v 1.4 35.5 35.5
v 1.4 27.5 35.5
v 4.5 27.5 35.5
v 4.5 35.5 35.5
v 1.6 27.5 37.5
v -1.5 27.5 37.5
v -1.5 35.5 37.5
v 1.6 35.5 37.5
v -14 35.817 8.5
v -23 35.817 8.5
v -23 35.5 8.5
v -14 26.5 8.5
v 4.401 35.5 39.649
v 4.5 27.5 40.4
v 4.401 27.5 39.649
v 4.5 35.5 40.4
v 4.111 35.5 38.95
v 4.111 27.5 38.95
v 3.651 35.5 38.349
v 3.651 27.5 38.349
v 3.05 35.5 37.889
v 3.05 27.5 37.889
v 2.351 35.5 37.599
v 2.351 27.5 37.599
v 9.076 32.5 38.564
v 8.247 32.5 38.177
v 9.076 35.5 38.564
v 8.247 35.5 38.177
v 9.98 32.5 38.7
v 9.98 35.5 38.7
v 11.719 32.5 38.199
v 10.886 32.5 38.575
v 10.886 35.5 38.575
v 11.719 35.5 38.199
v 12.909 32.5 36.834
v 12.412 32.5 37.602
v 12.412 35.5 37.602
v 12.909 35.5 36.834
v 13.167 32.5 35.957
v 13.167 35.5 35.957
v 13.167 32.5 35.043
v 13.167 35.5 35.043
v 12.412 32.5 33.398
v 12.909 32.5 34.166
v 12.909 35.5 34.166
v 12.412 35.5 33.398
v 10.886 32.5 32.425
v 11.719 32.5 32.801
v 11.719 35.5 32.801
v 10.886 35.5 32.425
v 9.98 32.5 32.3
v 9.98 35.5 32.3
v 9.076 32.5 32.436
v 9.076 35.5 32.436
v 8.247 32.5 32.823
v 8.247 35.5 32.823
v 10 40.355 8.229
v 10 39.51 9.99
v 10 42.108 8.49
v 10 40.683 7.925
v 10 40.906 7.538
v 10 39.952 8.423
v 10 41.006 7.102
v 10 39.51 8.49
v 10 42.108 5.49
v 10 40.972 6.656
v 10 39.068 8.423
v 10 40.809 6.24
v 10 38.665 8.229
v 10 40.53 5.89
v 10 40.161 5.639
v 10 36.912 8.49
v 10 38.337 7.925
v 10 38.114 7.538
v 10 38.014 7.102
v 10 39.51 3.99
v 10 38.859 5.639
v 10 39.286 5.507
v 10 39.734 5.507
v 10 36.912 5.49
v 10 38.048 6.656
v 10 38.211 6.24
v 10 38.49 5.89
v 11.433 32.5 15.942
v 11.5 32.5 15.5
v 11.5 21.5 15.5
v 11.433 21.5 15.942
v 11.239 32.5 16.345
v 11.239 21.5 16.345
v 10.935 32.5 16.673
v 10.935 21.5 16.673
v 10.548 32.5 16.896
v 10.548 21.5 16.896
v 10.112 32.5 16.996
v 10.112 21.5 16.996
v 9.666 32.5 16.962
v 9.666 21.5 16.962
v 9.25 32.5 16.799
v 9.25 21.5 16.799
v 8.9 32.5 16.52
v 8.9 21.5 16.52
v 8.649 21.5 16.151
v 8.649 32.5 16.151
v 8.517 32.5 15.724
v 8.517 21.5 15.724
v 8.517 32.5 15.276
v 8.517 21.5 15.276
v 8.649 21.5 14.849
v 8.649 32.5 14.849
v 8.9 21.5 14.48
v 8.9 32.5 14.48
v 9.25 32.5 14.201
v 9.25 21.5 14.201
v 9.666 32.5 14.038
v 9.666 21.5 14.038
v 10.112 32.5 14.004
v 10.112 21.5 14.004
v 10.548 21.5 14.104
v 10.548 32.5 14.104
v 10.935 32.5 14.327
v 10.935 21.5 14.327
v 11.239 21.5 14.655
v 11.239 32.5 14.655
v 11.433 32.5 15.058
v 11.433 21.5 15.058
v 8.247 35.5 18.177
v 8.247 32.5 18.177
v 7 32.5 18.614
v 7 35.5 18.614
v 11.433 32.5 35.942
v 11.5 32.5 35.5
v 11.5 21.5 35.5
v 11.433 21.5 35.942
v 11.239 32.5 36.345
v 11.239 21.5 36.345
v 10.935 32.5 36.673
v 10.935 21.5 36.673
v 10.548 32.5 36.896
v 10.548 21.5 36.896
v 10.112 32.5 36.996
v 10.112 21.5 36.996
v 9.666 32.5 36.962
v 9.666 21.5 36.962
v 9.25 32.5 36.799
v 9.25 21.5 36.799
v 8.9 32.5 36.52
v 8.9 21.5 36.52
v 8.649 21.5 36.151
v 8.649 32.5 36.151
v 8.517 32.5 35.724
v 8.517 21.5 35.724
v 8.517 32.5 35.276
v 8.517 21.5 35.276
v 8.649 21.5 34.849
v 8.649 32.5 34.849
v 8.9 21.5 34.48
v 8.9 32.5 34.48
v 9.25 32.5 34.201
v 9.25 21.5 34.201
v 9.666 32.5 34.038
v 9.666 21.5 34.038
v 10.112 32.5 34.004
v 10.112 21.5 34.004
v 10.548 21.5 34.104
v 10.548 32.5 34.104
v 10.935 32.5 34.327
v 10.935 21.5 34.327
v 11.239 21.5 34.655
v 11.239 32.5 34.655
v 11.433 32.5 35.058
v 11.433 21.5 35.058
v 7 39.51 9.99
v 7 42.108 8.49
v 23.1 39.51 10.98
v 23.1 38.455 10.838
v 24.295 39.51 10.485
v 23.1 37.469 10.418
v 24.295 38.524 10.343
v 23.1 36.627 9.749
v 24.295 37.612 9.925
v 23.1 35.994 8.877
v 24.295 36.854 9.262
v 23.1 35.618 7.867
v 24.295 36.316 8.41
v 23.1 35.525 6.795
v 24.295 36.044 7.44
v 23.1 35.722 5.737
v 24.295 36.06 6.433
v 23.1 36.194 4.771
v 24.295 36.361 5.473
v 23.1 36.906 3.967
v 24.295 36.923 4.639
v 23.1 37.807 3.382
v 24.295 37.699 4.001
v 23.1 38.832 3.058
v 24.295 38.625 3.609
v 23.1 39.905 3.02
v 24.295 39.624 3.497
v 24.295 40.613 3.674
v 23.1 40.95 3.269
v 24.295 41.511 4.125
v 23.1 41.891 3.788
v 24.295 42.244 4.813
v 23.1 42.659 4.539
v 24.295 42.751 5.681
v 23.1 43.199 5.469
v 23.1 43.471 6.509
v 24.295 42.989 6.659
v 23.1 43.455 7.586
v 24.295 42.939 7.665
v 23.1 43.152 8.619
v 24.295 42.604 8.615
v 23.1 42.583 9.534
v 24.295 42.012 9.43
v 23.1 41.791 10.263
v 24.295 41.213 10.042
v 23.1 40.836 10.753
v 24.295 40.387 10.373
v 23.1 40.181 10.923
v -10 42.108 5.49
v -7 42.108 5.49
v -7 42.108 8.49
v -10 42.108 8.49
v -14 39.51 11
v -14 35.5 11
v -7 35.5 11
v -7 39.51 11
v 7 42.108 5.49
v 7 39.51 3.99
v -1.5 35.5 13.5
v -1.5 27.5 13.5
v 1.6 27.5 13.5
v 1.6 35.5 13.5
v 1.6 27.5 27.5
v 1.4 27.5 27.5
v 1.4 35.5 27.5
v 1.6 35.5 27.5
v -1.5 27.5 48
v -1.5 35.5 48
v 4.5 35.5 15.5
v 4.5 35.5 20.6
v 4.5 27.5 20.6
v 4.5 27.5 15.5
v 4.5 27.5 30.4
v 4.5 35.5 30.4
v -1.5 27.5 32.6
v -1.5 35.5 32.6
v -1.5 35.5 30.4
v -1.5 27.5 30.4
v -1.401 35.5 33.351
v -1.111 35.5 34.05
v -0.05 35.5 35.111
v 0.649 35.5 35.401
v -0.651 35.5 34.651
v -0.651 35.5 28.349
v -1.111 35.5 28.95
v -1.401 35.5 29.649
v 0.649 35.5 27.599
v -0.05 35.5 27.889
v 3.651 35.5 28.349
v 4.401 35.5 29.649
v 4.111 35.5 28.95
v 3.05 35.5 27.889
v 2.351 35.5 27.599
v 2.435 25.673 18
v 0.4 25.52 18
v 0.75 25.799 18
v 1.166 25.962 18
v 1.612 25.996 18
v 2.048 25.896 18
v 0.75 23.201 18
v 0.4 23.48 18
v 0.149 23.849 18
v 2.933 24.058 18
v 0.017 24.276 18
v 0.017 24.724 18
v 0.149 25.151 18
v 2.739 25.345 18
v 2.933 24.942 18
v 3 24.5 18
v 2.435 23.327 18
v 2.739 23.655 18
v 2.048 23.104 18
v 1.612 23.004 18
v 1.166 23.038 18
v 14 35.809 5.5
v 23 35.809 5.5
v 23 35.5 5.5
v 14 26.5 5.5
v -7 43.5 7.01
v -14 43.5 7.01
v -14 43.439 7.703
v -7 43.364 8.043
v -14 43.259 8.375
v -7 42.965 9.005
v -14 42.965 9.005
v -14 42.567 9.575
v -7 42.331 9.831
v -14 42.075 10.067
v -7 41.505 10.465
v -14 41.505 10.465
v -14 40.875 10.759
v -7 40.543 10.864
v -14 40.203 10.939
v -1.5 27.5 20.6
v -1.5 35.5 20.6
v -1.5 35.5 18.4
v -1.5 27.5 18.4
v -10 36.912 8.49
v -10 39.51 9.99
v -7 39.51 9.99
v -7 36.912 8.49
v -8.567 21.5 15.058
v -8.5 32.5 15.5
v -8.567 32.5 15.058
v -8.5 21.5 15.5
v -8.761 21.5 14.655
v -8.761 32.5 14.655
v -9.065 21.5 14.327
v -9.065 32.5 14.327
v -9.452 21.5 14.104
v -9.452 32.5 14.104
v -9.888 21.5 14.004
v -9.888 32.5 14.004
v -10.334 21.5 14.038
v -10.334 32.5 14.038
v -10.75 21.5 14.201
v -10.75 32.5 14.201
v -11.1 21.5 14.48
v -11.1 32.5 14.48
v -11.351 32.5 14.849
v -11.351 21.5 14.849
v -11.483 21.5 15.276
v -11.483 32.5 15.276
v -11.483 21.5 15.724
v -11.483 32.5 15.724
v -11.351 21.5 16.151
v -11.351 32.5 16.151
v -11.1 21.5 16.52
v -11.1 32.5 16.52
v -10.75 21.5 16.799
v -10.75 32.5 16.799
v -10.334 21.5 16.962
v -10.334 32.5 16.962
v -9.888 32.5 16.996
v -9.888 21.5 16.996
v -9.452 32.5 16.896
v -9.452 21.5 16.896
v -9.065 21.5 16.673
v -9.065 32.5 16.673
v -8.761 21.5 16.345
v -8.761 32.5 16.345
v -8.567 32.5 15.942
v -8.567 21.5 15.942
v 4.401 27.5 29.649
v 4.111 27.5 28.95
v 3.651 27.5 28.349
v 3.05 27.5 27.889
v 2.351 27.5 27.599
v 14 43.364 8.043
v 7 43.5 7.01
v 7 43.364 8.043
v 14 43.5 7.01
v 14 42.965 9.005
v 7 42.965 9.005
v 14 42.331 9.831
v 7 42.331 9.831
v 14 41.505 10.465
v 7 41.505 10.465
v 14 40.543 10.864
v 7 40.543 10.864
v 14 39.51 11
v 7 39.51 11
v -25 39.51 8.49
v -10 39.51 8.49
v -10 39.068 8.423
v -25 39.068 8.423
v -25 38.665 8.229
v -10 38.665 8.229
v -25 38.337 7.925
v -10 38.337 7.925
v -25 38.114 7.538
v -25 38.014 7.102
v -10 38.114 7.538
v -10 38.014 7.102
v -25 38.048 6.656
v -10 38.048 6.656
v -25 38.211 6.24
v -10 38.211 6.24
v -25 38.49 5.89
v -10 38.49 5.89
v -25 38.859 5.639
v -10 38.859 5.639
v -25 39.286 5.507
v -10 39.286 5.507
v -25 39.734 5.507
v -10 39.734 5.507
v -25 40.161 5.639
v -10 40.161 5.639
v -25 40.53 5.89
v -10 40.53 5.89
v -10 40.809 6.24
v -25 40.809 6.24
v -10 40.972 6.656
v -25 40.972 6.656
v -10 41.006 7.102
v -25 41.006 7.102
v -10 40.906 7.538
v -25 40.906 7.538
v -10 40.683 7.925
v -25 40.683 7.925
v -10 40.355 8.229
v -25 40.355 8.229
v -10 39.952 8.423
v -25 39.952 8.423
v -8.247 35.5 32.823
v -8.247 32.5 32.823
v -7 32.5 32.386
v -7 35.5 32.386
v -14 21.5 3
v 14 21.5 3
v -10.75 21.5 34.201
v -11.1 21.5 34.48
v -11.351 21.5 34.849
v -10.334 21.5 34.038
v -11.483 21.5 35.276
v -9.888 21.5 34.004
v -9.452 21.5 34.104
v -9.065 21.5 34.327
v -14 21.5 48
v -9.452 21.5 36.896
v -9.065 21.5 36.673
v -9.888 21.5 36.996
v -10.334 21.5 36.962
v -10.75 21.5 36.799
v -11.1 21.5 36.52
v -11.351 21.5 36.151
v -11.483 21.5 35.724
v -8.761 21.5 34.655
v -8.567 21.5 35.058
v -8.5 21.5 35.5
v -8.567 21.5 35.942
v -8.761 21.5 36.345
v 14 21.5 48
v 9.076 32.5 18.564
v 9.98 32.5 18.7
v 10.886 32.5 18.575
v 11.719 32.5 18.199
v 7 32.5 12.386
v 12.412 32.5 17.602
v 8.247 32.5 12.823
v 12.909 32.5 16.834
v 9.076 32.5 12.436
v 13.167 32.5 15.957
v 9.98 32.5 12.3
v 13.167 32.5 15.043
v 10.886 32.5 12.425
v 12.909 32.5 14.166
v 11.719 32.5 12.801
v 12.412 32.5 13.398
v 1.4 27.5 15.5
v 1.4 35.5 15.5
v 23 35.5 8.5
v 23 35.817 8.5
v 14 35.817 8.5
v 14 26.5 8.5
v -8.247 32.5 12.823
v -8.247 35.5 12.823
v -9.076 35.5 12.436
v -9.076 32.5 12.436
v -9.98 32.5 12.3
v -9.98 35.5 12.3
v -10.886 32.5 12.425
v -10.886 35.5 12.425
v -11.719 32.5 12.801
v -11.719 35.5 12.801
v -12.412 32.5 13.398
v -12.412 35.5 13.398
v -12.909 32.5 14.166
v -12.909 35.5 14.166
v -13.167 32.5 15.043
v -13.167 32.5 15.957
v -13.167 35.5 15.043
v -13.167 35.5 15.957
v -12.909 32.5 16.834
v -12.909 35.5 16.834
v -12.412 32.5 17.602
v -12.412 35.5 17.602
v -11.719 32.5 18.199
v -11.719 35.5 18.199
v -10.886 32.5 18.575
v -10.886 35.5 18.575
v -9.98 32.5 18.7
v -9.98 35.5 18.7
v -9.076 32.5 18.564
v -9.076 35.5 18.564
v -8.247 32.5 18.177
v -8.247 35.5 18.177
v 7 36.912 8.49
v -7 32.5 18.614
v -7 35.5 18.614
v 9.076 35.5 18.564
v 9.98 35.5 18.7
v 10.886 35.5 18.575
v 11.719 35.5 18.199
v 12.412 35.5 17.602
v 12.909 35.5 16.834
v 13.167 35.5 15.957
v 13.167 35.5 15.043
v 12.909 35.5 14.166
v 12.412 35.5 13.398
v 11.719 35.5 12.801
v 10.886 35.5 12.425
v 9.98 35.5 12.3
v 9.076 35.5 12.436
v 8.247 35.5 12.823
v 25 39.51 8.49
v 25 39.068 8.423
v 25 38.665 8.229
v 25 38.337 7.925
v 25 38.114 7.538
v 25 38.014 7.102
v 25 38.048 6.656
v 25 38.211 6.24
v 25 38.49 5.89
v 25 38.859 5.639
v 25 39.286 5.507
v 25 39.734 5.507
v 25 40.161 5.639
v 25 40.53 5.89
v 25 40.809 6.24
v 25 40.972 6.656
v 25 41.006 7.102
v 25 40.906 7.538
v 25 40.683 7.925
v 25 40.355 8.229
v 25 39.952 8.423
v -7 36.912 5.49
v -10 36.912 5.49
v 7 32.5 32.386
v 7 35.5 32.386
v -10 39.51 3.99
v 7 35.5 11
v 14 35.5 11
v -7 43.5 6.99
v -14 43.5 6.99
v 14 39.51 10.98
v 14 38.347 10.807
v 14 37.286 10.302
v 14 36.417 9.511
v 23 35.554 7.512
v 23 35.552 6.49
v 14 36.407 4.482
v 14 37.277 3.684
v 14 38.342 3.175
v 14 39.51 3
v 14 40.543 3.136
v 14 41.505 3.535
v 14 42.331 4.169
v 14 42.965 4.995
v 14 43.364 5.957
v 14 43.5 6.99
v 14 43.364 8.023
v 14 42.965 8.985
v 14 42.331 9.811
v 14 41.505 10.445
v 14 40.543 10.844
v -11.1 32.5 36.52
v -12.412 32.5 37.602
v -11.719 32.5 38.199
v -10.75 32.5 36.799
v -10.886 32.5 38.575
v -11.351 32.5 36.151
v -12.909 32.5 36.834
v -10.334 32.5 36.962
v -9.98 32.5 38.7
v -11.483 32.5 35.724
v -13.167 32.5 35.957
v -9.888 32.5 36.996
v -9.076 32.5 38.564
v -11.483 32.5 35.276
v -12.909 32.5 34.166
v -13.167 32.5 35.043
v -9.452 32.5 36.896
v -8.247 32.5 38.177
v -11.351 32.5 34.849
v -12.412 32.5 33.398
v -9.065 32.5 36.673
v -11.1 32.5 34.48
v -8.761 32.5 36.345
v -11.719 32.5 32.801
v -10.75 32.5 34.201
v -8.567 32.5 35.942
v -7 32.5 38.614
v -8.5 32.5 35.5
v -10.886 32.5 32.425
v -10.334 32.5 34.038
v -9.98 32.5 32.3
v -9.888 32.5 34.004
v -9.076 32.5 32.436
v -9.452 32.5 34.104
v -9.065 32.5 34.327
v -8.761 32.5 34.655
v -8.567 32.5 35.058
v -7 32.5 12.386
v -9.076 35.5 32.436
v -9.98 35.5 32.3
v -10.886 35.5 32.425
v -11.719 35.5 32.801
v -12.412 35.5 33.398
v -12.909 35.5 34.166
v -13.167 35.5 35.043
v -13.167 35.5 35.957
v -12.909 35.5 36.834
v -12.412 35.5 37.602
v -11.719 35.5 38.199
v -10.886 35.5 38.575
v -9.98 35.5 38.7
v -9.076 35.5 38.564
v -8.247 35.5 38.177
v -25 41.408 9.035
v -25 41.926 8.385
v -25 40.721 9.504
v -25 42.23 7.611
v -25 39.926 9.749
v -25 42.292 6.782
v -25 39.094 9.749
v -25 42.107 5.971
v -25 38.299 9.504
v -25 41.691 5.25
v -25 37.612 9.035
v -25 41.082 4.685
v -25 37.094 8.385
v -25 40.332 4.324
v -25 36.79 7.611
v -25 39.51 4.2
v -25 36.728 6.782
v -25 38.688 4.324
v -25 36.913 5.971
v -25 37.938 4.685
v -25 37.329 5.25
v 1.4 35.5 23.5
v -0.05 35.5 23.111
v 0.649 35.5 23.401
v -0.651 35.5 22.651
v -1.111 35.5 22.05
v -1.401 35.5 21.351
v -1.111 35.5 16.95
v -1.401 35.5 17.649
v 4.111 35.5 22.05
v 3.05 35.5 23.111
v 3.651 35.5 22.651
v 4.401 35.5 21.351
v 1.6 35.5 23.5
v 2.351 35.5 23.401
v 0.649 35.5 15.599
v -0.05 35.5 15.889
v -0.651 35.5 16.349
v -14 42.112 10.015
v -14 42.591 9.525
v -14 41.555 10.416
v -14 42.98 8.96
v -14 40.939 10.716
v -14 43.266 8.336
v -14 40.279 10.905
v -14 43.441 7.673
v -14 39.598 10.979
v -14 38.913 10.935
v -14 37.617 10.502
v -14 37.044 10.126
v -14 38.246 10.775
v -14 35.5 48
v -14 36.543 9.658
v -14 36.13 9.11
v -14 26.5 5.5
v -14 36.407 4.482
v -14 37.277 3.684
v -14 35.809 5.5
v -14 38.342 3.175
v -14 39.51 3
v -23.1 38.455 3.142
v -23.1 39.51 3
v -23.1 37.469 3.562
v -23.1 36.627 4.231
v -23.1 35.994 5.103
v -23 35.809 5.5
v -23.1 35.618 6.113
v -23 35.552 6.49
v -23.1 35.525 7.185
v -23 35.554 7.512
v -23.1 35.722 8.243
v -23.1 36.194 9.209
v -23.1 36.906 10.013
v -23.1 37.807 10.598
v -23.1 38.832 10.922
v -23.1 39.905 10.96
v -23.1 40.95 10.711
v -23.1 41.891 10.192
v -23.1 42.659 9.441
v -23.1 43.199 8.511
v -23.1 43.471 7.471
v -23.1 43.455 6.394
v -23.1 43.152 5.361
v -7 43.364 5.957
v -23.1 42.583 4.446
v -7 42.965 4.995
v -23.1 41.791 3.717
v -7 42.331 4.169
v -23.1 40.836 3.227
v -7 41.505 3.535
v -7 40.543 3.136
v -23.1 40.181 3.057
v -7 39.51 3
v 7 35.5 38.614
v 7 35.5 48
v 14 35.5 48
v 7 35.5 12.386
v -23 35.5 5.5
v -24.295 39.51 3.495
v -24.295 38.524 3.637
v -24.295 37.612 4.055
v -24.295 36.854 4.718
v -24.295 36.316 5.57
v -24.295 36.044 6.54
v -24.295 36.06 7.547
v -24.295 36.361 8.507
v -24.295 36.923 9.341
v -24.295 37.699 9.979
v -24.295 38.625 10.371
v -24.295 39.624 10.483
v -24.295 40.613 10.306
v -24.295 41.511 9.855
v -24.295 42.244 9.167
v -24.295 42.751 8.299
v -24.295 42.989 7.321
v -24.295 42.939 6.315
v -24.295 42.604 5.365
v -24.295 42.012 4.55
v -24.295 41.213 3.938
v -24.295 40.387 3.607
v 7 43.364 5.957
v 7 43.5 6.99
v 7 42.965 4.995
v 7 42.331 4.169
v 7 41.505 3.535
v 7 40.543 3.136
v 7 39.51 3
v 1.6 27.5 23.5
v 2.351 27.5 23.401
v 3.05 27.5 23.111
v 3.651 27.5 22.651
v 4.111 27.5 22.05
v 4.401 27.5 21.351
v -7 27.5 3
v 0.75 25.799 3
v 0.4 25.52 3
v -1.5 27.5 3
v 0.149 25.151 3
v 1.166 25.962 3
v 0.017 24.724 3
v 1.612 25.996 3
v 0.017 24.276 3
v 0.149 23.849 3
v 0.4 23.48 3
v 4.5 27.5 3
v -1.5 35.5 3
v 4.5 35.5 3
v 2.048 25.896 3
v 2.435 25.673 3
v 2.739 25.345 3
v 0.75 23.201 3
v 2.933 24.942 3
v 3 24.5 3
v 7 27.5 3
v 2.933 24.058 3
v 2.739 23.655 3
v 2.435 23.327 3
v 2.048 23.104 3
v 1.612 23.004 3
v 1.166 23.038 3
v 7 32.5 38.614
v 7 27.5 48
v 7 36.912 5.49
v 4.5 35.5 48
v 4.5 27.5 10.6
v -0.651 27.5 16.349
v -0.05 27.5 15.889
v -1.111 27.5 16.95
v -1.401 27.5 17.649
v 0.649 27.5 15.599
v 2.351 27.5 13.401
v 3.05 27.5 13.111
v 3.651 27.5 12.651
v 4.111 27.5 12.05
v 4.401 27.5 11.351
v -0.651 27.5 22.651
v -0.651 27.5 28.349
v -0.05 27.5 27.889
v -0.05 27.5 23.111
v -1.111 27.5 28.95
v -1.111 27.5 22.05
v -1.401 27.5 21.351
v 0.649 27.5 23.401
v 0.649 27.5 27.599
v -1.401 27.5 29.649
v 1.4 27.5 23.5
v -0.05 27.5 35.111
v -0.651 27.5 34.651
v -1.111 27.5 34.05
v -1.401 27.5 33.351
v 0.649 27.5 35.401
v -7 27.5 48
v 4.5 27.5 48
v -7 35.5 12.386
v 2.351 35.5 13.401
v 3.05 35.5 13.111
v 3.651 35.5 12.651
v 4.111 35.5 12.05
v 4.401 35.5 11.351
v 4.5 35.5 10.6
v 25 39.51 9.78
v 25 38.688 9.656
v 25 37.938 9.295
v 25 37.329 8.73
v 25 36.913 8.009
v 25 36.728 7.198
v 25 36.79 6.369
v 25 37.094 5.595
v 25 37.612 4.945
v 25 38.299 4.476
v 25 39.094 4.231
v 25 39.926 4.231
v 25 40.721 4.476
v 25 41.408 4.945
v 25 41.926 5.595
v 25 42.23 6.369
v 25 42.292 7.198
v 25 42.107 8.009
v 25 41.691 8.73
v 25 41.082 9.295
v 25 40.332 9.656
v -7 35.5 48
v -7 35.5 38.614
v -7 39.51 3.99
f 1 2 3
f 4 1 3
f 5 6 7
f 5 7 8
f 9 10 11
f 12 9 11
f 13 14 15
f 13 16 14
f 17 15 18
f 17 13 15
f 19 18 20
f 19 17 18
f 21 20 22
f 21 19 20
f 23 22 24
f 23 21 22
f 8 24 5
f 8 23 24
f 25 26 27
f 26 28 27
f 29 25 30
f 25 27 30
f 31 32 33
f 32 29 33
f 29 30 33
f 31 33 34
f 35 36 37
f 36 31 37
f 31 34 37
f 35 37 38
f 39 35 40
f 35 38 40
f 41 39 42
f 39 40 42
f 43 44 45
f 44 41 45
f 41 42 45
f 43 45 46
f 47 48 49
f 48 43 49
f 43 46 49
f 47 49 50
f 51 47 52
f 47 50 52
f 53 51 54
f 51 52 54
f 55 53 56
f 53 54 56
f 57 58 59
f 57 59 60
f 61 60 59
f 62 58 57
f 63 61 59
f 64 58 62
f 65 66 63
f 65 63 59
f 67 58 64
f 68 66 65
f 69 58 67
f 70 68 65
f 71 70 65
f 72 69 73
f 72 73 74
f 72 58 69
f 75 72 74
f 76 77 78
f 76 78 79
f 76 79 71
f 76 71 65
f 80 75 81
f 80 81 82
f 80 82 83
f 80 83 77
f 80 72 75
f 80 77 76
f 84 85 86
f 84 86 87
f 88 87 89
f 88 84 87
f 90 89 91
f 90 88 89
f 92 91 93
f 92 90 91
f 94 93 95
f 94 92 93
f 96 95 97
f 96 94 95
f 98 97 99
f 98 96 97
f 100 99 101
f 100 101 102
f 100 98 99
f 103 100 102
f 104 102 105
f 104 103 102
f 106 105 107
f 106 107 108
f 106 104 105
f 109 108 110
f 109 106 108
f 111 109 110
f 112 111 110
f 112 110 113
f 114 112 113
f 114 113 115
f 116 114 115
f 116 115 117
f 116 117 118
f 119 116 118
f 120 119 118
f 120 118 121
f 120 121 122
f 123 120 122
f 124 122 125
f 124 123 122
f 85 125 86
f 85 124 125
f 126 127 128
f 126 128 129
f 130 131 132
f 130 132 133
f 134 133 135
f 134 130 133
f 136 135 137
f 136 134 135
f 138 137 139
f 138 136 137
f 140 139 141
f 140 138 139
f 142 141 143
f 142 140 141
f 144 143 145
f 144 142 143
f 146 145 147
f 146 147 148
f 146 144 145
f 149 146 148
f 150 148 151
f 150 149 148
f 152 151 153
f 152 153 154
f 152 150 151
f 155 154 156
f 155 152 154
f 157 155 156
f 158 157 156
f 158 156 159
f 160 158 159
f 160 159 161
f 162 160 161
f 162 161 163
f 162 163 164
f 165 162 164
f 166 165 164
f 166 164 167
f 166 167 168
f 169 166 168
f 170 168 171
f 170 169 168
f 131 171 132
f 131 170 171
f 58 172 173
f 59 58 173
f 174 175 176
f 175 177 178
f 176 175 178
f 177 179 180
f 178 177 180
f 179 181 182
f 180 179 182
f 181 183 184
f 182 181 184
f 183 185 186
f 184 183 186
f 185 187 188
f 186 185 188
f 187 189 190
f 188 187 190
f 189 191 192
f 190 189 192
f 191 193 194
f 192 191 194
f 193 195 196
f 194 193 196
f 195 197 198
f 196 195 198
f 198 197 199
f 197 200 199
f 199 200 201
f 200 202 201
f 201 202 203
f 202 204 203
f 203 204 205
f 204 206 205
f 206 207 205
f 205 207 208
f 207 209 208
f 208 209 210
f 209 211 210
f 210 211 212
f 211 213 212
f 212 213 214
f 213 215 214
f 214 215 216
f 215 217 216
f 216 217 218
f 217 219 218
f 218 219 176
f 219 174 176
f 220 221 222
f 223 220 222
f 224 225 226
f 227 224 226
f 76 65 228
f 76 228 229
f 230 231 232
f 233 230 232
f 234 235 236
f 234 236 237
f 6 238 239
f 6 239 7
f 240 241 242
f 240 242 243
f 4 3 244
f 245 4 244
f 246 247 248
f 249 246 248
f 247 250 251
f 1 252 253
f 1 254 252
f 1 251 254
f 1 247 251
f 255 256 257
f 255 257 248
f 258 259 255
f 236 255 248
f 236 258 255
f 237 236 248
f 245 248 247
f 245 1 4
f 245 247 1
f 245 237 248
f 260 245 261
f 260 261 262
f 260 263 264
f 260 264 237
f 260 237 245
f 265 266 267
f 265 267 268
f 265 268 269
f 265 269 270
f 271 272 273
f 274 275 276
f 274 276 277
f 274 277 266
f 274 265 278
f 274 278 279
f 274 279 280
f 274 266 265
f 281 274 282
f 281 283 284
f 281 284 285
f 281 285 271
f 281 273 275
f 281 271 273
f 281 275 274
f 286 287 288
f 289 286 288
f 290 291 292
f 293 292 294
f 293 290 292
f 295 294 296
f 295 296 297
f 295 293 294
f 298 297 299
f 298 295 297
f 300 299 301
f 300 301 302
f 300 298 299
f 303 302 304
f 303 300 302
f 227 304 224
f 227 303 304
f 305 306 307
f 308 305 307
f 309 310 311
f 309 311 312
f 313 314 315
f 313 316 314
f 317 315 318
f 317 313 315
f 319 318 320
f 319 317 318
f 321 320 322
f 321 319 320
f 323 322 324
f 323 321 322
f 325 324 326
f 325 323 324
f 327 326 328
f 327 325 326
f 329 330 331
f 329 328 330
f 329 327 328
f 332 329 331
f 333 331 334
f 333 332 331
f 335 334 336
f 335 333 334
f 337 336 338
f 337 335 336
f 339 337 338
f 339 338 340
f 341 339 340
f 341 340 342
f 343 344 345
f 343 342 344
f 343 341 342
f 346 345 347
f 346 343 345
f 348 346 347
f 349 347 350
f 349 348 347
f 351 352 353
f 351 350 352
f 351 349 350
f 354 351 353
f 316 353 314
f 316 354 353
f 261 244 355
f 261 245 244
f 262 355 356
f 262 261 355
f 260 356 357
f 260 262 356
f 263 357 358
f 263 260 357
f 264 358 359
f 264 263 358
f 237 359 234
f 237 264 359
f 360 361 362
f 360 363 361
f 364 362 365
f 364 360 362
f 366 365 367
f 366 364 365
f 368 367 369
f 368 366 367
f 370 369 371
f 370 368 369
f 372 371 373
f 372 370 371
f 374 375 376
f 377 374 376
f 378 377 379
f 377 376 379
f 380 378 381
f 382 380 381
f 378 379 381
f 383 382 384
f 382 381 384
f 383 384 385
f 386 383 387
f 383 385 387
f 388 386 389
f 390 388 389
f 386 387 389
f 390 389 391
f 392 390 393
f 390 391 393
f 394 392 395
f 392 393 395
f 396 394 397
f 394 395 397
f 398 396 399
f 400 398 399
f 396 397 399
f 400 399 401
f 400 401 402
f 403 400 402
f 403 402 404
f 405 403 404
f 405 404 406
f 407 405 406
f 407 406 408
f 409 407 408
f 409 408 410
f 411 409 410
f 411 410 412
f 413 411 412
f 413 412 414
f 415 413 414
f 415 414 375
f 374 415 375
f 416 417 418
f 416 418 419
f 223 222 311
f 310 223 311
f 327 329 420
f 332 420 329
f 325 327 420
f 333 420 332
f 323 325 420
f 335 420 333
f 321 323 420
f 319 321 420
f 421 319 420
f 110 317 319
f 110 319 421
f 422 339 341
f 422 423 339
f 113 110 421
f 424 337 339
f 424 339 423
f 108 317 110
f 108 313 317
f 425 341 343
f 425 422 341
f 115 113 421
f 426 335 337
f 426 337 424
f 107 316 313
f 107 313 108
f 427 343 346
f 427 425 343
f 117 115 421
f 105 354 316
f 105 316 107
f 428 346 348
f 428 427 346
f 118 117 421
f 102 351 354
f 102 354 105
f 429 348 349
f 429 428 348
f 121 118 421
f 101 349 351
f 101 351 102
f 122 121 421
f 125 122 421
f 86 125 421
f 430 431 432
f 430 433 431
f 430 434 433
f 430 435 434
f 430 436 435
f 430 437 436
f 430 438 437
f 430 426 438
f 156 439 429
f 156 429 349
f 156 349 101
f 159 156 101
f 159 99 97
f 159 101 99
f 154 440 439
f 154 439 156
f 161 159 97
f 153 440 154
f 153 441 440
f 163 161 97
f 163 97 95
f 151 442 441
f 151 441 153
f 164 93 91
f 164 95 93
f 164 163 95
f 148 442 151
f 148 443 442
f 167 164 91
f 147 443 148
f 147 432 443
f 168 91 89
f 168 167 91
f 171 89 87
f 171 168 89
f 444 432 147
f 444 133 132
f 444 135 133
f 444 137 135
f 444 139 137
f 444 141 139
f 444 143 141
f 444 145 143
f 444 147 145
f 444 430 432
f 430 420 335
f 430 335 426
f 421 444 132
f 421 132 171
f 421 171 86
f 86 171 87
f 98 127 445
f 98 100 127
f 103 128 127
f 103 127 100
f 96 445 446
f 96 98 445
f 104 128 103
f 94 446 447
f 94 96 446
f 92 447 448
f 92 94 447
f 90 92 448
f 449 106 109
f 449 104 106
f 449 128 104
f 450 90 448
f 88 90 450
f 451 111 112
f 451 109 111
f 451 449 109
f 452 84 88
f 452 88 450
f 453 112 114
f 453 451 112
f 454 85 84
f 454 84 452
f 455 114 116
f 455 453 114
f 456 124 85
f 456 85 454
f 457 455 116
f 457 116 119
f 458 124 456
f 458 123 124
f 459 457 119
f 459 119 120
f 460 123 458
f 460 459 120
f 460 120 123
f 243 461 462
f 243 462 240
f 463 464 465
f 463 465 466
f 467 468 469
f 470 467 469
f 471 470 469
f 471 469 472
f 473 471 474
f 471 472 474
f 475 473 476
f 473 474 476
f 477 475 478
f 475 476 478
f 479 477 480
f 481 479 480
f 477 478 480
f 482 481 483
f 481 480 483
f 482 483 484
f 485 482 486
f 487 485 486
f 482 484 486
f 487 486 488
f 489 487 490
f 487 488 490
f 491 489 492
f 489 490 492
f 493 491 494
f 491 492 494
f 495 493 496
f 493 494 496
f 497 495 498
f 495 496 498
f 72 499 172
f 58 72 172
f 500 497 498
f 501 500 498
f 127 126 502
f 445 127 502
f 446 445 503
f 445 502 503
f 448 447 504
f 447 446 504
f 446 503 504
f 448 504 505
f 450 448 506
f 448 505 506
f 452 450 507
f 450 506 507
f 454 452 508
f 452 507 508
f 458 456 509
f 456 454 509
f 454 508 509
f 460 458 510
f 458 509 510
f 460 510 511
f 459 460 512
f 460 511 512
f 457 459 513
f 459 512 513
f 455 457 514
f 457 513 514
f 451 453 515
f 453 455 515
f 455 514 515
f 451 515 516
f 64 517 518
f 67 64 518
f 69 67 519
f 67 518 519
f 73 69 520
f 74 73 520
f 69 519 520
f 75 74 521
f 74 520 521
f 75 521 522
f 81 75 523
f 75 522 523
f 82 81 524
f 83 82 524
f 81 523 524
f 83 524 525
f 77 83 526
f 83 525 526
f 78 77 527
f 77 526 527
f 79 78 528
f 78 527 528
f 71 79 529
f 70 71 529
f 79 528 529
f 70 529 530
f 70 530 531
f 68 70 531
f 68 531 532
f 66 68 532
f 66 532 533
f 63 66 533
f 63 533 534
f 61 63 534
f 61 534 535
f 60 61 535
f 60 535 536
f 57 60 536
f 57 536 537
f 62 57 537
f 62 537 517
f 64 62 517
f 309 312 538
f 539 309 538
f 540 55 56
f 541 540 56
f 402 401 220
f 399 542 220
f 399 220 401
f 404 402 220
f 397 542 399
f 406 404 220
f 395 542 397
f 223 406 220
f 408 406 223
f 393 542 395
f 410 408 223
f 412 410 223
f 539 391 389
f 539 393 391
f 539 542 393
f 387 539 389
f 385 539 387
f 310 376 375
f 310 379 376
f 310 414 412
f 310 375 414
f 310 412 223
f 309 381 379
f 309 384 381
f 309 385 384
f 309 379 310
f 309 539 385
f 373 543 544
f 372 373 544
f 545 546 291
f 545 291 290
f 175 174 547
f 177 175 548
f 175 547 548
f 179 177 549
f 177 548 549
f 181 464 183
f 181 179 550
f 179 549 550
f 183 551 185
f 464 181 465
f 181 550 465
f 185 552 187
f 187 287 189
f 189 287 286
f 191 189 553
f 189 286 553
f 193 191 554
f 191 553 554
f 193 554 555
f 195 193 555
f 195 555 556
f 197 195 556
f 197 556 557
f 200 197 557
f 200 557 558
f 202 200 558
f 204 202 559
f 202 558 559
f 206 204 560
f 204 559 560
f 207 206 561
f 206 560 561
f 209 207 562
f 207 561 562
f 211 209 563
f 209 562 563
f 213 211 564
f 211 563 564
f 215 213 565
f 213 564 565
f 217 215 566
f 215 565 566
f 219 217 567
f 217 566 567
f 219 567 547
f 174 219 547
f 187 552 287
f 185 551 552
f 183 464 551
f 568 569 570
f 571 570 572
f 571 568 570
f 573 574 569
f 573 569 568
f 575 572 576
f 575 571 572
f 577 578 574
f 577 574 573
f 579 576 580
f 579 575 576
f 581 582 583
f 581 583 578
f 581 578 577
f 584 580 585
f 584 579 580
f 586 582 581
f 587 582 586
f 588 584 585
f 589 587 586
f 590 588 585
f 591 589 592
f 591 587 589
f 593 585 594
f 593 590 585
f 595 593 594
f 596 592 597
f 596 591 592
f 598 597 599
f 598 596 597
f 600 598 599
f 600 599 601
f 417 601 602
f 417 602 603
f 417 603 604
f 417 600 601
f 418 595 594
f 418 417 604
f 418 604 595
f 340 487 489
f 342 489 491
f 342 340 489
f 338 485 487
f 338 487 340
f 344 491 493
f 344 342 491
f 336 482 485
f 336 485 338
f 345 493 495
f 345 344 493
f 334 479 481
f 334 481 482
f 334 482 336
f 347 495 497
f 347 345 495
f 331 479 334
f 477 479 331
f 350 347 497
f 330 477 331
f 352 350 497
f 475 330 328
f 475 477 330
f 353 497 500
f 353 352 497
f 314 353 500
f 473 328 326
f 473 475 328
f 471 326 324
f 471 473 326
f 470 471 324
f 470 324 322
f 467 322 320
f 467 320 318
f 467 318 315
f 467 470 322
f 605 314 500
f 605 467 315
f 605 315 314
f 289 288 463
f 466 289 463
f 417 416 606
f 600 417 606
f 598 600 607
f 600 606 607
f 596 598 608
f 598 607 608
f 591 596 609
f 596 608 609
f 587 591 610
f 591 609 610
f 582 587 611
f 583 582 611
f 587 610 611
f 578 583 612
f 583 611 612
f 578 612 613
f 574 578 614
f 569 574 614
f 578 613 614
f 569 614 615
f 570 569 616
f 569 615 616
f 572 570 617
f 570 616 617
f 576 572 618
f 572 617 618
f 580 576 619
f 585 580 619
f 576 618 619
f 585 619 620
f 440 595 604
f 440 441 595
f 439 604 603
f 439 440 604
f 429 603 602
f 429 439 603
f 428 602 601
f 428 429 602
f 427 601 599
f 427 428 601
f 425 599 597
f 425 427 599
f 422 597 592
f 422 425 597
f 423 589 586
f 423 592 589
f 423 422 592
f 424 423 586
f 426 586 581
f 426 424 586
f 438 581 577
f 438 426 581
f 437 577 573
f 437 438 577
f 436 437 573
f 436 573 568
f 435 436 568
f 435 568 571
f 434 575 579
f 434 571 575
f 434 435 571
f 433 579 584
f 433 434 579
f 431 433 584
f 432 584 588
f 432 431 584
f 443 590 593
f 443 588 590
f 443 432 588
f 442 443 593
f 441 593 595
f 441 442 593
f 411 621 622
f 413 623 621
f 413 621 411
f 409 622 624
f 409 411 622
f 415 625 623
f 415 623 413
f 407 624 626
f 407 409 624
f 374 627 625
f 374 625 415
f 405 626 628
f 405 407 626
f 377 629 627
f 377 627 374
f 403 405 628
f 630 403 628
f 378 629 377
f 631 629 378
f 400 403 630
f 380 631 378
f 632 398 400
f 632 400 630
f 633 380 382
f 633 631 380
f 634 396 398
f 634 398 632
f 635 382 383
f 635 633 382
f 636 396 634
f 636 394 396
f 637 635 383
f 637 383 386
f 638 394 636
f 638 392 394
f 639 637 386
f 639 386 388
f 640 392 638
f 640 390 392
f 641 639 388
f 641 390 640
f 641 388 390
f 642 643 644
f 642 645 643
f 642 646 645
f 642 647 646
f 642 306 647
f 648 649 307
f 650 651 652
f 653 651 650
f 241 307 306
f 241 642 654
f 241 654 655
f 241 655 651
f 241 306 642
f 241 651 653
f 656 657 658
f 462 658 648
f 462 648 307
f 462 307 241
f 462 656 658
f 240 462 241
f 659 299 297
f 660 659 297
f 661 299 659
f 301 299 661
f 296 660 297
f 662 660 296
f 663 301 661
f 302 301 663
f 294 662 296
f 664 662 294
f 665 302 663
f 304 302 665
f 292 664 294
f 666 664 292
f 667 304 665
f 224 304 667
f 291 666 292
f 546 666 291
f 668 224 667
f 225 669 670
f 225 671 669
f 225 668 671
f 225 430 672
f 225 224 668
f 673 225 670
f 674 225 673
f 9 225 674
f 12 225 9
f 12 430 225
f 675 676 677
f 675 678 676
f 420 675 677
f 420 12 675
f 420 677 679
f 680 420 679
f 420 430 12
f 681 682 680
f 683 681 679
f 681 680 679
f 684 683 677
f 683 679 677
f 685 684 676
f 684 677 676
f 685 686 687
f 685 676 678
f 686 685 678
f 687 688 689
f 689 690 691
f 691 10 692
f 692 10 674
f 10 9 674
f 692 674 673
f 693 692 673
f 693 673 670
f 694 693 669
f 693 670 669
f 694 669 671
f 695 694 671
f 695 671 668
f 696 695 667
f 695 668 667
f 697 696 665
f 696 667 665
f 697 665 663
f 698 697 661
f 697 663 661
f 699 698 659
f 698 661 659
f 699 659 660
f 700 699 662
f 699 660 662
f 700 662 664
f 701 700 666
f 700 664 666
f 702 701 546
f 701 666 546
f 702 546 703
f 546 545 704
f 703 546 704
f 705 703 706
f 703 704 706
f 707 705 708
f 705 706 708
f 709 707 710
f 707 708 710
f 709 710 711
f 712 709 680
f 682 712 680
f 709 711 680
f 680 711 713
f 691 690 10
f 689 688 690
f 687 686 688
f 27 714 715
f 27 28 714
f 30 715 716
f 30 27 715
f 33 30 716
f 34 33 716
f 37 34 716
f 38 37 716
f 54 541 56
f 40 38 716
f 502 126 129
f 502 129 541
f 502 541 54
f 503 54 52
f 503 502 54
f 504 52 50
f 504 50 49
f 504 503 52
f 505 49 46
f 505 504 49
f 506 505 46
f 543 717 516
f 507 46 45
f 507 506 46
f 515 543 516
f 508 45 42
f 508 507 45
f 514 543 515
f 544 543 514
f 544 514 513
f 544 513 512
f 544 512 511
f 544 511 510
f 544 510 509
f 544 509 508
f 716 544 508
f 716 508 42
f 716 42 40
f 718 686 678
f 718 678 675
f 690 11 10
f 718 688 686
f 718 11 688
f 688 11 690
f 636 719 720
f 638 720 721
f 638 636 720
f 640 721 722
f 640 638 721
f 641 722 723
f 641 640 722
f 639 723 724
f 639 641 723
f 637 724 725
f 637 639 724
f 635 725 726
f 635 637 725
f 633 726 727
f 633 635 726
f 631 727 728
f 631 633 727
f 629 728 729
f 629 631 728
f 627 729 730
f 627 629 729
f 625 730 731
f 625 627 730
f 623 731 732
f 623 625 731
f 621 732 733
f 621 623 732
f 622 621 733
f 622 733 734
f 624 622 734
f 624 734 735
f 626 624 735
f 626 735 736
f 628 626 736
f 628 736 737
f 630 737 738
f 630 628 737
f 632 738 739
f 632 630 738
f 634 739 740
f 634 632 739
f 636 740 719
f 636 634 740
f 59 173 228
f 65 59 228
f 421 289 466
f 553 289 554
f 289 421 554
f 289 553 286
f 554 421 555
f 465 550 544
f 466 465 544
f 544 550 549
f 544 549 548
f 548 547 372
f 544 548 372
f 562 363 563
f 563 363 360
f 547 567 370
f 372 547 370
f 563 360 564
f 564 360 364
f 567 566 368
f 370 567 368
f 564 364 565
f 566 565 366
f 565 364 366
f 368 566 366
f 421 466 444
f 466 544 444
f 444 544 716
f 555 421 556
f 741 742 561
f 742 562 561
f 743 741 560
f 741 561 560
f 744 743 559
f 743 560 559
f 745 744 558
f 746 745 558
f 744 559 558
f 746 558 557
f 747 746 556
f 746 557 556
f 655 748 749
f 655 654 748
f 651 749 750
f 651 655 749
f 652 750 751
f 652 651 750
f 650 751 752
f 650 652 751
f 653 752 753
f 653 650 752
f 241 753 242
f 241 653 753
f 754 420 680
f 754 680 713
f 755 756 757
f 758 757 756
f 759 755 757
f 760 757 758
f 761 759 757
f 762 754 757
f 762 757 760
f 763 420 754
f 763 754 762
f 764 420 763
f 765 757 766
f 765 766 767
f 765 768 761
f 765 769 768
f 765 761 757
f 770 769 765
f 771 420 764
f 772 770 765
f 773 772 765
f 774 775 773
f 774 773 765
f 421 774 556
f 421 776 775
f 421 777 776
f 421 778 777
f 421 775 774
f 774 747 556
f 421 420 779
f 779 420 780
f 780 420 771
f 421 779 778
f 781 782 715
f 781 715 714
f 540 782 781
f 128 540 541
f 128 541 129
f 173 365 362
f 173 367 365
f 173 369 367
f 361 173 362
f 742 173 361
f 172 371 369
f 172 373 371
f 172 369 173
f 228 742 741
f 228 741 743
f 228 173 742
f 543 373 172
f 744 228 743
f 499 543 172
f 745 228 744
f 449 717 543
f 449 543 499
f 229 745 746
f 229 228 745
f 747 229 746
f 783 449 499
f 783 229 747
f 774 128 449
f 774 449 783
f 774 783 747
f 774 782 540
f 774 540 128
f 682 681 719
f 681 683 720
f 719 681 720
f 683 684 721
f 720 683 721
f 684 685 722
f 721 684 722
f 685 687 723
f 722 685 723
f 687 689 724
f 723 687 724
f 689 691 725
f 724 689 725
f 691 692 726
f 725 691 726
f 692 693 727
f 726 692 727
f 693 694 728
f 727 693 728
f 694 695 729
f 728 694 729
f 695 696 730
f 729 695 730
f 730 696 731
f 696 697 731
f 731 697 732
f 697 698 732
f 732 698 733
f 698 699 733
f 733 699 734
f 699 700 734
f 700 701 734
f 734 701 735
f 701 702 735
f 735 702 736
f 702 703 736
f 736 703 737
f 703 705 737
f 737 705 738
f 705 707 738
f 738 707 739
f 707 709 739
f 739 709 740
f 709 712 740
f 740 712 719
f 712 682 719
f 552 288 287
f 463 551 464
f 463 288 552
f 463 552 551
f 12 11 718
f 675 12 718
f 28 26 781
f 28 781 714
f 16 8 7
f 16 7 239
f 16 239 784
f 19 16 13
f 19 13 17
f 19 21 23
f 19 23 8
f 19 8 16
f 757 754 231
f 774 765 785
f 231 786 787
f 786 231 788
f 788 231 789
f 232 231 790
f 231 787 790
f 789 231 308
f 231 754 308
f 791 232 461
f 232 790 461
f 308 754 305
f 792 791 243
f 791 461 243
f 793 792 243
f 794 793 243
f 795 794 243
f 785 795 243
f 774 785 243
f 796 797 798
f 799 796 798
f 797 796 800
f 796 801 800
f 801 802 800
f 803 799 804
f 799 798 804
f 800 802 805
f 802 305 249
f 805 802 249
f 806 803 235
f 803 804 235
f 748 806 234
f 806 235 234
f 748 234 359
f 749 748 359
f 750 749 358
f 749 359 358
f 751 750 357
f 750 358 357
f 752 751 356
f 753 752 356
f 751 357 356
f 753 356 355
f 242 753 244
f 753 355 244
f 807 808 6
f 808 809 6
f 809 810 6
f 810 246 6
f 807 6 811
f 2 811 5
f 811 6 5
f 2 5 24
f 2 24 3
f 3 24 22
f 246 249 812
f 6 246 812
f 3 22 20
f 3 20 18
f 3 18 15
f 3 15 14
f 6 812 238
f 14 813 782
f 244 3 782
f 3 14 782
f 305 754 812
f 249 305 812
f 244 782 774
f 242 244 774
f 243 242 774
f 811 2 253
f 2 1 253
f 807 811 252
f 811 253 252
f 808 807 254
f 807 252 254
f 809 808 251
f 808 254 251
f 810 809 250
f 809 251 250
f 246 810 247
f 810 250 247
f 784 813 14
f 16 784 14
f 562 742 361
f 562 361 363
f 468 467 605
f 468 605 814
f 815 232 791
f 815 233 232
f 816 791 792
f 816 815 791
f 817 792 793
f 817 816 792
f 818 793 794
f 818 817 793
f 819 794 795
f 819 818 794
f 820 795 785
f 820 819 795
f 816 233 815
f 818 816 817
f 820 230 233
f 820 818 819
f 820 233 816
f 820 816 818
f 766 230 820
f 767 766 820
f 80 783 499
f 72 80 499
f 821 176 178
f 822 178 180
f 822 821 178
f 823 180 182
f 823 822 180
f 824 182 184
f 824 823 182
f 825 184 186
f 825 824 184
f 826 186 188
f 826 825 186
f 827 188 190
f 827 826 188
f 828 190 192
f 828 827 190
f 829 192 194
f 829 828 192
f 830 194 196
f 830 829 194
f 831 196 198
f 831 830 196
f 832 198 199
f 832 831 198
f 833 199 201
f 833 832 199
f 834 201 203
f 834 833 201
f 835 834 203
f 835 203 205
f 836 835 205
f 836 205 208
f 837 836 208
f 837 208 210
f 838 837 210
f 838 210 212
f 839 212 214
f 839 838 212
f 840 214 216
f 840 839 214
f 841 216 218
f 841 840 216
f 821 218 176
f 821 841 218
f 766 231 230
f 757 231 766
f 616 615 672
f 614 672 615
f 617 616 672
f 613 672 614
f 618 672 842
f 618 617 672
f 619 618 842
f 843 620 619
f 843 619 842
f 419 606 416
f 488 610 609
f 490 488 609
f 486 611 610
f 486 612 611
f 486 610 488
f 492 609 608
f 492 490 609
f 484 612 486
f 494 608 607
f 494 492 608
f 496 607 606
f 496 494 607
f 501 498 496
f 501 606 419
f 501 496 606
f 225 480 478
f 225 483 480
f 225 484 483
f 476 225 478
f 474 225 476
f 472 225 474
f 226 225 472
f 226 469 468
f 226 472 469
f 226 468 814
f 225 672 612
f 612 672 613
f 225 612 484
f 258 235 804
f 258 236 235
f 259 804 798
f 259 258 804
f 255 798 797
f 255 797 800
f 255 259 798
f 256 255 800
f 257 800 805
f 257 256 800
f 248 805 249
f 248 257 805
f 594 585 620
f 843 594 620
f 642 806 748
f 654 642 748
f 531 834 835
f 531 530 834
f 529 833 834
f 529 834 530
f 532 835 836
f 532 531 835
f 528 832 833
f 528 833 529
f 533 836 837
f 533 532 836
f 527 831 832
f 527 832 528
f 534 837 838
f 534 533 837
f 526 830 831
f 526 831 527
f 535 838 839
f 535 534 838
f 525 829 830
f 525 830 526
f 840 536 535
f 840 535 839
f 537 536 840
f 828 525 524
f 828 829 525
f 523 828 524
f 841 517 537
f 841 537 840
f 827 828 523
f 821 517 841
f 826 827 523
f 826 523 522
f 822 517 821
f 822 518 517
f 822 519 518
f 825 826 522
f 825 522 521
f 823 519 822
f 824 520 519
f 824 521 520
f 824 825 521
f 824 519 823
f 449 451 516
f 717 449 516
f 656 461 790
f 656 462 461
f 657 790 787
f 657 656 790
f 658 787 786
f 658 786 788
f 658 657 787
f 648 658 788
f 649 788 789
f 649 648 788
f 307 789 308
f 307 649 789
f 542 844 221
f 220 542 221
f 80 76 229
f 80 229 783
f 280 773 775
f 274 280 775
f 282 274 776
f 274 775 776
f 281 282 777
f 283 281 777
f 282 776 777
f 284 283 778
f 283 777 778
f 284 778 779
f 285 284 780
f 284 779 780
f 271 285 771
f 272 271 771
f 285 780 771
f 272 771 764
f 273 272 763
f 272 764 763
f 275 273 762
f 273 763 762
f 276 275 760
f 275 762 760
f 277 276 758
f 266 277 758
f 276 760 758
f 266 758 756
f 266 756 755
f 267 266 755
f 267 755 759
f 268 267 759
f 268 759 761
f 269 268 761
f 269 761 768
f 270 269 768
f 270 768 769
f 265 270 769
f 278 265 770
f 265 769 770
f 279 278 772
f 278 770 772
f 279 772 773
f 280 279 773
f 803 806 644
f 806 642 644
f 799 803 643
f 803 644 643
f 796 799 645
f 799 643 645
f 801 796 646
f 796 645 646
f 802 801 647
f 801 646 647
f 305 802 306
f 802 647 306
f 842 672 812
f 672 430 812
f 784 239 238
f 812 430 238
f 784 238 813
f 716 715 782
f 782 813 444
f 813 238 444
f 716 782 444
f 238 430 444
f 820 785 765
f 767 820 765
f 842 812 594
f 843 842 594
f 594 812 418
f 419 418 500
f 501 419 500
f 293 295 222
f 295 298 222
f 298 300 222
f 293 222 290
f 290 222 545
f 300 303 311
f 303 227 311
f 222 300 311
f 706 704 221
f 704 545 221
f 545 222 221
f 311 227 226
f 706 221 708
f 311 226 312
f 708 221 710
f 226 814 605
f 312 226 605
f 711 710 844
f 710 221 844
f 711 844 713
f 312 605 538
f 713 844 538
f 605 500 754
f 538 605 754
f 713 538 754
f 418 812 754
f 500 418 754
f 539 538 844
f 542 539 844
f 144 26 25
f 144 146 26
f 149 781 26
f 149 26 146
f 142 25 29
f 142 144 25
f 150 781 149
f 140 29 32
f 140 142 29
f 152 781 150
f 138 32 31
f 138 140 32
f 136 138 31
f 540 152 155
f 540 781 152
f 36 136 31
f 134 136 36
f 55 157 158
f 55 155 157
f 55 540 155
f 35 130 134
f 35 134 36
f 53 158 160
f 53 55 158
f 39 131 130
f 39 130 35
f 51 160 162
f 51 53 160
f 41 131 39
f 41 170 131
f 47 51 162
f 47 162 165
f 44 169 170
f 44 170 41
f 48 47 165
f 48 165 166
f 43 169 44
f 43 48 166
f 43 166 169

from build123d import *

# Parameters (mm, degrees)
SKETCH008_W     = 28
SKETCH008_H     = 45
SKETCH008_R     = 1.5
PAD003_DEPTH    = 6
SKETCH009_W     = 7
SKETCH009_H     = 45
SKETCH009_R     = 1.5
SKETCH009_W_2   = 6
SKETCH009_H_2   = 10.5
SKETCH009_H_3   = 8
PAD004_DEPTH    = 8
FILLET002_R     = 2.9
SKETCH011_W     = 7
SKETCH011_H     = 8
PAD005_DEPTH    = 8
FILLET003_R     = 3.99
SKETCH012_R     = 3.99
PAD006_DEPTH    = 11
SKETCH013_R     = 3.99
PAD007_DEPTH    = 11
SKETCH014_R     = 1.5
POCKET001_DEPTH = 52
CHAMFER001_SIZE = 1.2
SKETCH015_W     = 3
SKETCH015_H     = 10
PAD008_DEPTH    = 9
SKETCH016_W     = 3
SKETCH016_H     = 10
PAD009_DEPTH    = 9
CHAMFER002_SIZE = 8.9999
CHAMFER003_SIZE = 0.7
POCKET002_DEPTH = 3
POCKET003_DEPTH = 3
SKETCH019_R     = 1.5
POCKET004_DEPTH = 15
SKETCH020_R     = 3.2
POCKET005_DEPTH = 3
CHAMFER004_SIZE = 2


with BuildPart() as part:
    # Sketch008 → Pad003 (new body)
    with BuildSketch(Plane.XZ):
        with Locations((14, 22.5)):
            Rectangle(SKETCH008_W, SKETCH008_H)
        with Locations((4, 32.5)):
            Circle(SKETCH008_R, mode=Mode.SUBTRACT)
        with Locations((24, 32.5)):
            Circle(SKETCH008_R, mode=Mode.SUBTRACT)
        with Locations((4, 12.5)):
            Circle(SKETCH008_R, mode=Mode.SUBTRACT)
        with Locations((24, 12.5)):
            Circle(SKETCH008_R, mode=Mode.SUBTRACT)
    extrude(amount=PAD003_DEPTH)

    # Sketch009 (on Face9 of Pad003) → Pad004 (join)
    with BuildSketch(Plane(origin=(0, 0, 0), x_dir=(1, 0, 0), z_dir=(0, 1, 0))):
        with Locations((3.5, -22.5)):
            Rectangle(SKETCH009_W, SKETCH009_H)
        with Locations((4, -12.5)):
            Circle(SKETCH009_R, mode=Mode.SUBTRACT)
        with Locations((4, -32.5)):
            Circle(SKETCH009_R, mode=Mode.SUBTRACT)
        with Locations((24.5, -22.5)):
            Rectangle(SKETCH009_W, SKETCH009_H)
        with Locations((24, -12.5)):
            Circle(SKETCH009_R, mode=Mode.SUBTRACT)
        with Locations((24, -32.5)):
            Circle(SKETCH009_R, mode=Mode.SUBTRACT)
        with Locations((15.5, -5.25)):
            Rectangle(SKETCH009_W_2, SKETCH009_H_2)
        with Locations((15.5, -16.5)):
            Rectangle(SKETCH009_W_2, SKETCH009_H_3)
        with Locations((15.5, -28.5)):
            Rectangle(SKETCH009_W_2, SKETCH009_H_3)
        with Locations((15.5, -39.75)):
            Rectangle(SKETCH009_W_2, SKETCH009_H_2)
    extrude(amount=PAD004_DEPTH)

    # Fillet002
    fillet002_edges = [part.edges().sort_by_distance(p)[0] for p in [
        (12.5, 4, 24.5),
        (18.5, 4, 24.5),
        (12.5, 4, 32.5),
        (18.5, 4, 34.5),
        (18.5, 4, 20.5),
        (12.5, 4, 20.5),
        (12.5, 4, 12.5),
        (18.5, 4, 10.5),
    ]]
    fillet(fillet002_edges, radius=FILLET002_R)

    # Sketch011 (on Face36 of Fillet002) → Pad005 (join)
    with BuildSketch(Plane(origin=(0, 8, 0), x_dir=(1, 0, 0), z_dir=(0, 1, 0))):
        with Locations((3.5, -4)):
            Rectangle(SKETCH011_W, SKETCH011_H)
        with Locations((24.5, -4)):
            Rectangle(SKETCH011_W, SKETCH011_H)
    extrude(amount=PAD005_DEPTH)

    # Fillet003
    fillet003_edges = [part.edges().sort_by_distance(p)[0] for p in [
        (3.5, 16, 8),
        (3.5, 16, 0),
        (24.5, 16, 0),
        (24.5, 16, 8),
    ]]
    fillet(fillet003_edges, radius=FILLET003_R)

    # Sketch012 (on Face8 of Fillet003) → Pad006 (join)
    with BuildSketch(Plane(origin=(0, 0, 0), x_dir=(0, 0, -1), z_dir=(-1, 0, 0))):
        with Locations((-3.99, -12.01)):
            Circle(SKETCH012_R)
    extrude(amount=PAD006_DEPTH)

    # Sketch013 (on Face68 of Pad006) → Pad007 (join)
    with BuildSketch(Plane(origin=(28, 0, 0), x_dir=(0, 0, 1), z_dir=(1, 0, 0))):
        with Locations((3.99, -12.01)):
            Circle(SKETCH013_R)
    extrude(amount=PAD007_DEPTH)

    # Sketch014 (on Face70 of Pad007) → Pocket001 (cut)
    with BuildSketch(Plane(origin=(39, 0, 0), x_dir=(0, 0, 1), z_dir=(1, 0, 0))):
        with Locations((3.99, -12.01)):
            Circle(SKETCH014_R)
    extrude(amount=-POCKET001_DEPTH, mode=Mode.SUBTRACT)

    # Chamfer001
    chamfer001_edges = [part.edges().sort_by_distance(p)[0] for p in [
        (-11, 12.01, 7.98),
        (39, 12.01, 0),
    ]]
    chamfer(chamfer001_edges, length=CHAMFER001_SIZE)

    # Sketch015 (on Face10 of Chamfer001) → Pad008 (join)
    with BuildSketch(Plane(origin=(0, 0, 0), x_dir=(0, 0, -1), z_dir=(-1, 0, 0))):
        with Locations((-4, -4)):
            Rectangle(SKETCH015_W, SKETCH015_H)
    extrude(amount=PAD008_DEPTH)

    # Sketch016 (on Face62 of Pad008) → Pad009 (join)
    with BuildSketch(Plane(origin=(28, 0, 0), x_dir=(0, 0, 1), z_dir=(1, 0, 0))):
        with Locations((4, -4)):
            Rectangle(SKETCH016_W, SKETCH016_H)
    extrude(amount=PAD009_DEPTH)

    # Chamfer002
    chamfer002_edges = [part.edges().sort_by_distance(p)[0] for p in [
        (37, -1, 4),
        (-9, -1, 4),
    ]]
    chamfer(chamfer002_edges, length=CHAMFER002_SIZE)

    # Chamfer003
    chamfer003_edges = [part.edges().sort_by_distance(p)[0] for p in [
        (-9.8, 12.01, 7.98),
        (37.8, 12.01, 0),
    ]]
    chamfer(chamfer003_edges, length=CHAMFER003_SIZE)

    # Sketch017 (on Face75 of Chamfer003) → Pocket002 (cut)
    with BuildSketch(Plane(origin=(21, 0, 0), x_dir=(0, 0, -1), z_dir=(-1, 0, 0))):
        Polygon((-2.49, -14.608076), (-0.99, -12.01), (-2.49, -9.411924), (-5.49, -9.411924), (-6.99, -12.01), (-5.49, -14.608076), align=None)
    extrude(amount=-POCKET002_DEPTH, mode=Mode.SUBTRACT)

    # Sketch018 (on Face16 of Pocket002) → Pocket003 (cut)
    with BuildSketch(Plane(origin=(7, 0, 0), x_dir=(0, 0, 1), z_dir=(1, 0, 0))):
        Polygon((5.49, -14.608076), (6.99, -12.01), (5.49, -9.411924), (2.49, -9.411924), (0.99, -12.01), (2.49, -14.608076), align=None)
    extrude(amount=-POCKET003_DEPTH, mode=Mode.SUBTRACT)

    # Sketch019 (on Face22 of Pocket003) → Pocket004 (cut)
    with BuildSketch(Plane(origin=(0, 0, 0), x_dir=(1, 0, 0), z_dir=(0, 0, -1))):
        with Locations((15.5, 3)):
            Circle(SKETCH019_R)
    extrude(amount=-POCKET004_DEPTH, mode=Mode.SUBTRACT)

    # Sketch020 (on Face32 of Pocket004) → Pocket005 (cut)
    with BuildSketch(Plane(origin=(0, 8, 0), x_dir=(1, 0, 0), z_dir=(0, 1, 0))):
        with Locations((4, -12.5)):
            Circle(SKETCH020_R)
        with Locations((4, -32.5)):
            Circle(SKETCH020_R)
        with Locations((24, -32.5)):
            Circle(SKETCH020_R)
        with Locations((24, -12.5)):
            Circle(SKETCH020_R)
    extrude(amount=-POCKET005_DEPTH, mode=Mode.SUBTRACT)

    # Chamfer004
    chamfer004_edges = [part.edges().sort_by_distance(p)[0] for p in [
        (7, 6.5, 11.386447),
        (7, 6.5, 13.613553),
        (21, 6.5, 11.386447),
        (7, 6.5, 31.386447),
        (21, 6.5, 31.386447),
        (7, 6.5, 33.613553),
        (21, 6.5, 33.613553),
        (21, 6.5, 13.613553),
    ]]
    chamfer(chamfer004_edges, length=CHAMFER004_SIZE)


with BuildPart() as part_1:
    # Body006 placement: moved
    add(part.part.moved(Location((-14, 27.5, 3))))


solid = part_1.part
